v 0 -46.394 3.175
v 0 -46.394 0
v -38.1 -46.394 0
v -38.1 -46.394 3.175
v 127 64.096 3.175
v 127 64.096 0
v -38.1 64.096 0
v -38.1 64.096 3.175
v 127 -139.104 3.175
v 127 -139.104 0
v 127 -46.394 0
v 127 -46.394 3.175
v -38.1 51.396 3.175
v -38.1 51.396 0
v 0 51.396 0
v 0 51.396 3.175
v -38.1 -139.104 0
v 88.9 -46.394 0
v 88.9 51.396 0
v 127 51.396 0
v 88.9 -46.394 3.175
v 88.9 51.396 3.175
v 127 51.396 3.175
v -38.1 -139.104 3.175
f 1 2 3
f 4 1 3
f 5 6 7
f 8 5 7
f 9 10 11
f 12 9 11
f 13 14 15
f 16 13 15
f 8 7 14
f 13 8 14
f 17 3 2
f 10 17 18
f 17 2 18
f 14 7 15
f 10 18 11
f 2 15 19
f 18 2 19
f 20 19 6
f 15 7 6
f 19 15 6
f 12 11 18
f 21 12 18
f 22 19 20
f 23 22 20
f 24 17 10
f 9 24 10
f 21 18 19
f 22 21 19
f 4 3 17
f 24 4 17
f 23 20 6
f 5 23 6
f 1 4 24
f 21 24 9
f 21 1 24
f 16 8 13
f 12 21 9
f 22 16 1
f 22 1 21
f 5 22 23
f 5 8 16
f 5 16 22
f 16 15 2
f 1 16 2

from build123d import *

# Parameters (mm, degrees)
F0_W     = 16.9926
F0_H     = 23.0124
F1_DEPTH = 3.175


with BuildPart() as f1:
    # F0 (on Top) → F1 (new body)
    with BuildSketch(Plane.XY):
        Polygon((-38.1, 64.095948), (-38.1, 58.695937), (-38.1, 51.395948), (0, 51.395948), (0, 24.957037), (16.9926, 24.957037), (16.9926, 1.944637), (0, 1.944637), (0, -46.394052), (-38.1, -46.394052), (-38.1, -73.704052), (-38.1, -101.004052), (12.7, -101.004052), (12.7, -126.404052), (-38.1, -126.404052), (-38.1, -139.104052), (127, -139.104052), (127, -126.404052), (76.2, -126.404052), (76.2, -101.004052), (127, -101.004052), (127, -73.704052), (127, -46.394052), (88.9, -46.394052), (88.9, 1.944637), (71.9074, 1.944637), (71.9074, 24.957037), (88.9, 24.957037), (88.9, 51.395948), (127, 51.395948), (127, 58.695937), (127, 64.095948), align=None)
        with Locations((80.4037, 13.450837)):
            Rectangle(F0_W, F0_H)
        with Locations((8.4963, 13.450837)):
            Rectangle(F0_W, F0_H)
        Polygon((12.7, -101.004052), (-38.1, -101.004052), (-38.1, -113.704052), (-38.1, -126.404052), (12.7, -126.404052), align=None)
        Polygon((127, -113.704052), (127, -101.004052), (76.2, -101.004052), (76.2, -126.404052), (127, -126.404052), align=None)
    extrude(amount=F1_DEPTH)


solid = f1.part
